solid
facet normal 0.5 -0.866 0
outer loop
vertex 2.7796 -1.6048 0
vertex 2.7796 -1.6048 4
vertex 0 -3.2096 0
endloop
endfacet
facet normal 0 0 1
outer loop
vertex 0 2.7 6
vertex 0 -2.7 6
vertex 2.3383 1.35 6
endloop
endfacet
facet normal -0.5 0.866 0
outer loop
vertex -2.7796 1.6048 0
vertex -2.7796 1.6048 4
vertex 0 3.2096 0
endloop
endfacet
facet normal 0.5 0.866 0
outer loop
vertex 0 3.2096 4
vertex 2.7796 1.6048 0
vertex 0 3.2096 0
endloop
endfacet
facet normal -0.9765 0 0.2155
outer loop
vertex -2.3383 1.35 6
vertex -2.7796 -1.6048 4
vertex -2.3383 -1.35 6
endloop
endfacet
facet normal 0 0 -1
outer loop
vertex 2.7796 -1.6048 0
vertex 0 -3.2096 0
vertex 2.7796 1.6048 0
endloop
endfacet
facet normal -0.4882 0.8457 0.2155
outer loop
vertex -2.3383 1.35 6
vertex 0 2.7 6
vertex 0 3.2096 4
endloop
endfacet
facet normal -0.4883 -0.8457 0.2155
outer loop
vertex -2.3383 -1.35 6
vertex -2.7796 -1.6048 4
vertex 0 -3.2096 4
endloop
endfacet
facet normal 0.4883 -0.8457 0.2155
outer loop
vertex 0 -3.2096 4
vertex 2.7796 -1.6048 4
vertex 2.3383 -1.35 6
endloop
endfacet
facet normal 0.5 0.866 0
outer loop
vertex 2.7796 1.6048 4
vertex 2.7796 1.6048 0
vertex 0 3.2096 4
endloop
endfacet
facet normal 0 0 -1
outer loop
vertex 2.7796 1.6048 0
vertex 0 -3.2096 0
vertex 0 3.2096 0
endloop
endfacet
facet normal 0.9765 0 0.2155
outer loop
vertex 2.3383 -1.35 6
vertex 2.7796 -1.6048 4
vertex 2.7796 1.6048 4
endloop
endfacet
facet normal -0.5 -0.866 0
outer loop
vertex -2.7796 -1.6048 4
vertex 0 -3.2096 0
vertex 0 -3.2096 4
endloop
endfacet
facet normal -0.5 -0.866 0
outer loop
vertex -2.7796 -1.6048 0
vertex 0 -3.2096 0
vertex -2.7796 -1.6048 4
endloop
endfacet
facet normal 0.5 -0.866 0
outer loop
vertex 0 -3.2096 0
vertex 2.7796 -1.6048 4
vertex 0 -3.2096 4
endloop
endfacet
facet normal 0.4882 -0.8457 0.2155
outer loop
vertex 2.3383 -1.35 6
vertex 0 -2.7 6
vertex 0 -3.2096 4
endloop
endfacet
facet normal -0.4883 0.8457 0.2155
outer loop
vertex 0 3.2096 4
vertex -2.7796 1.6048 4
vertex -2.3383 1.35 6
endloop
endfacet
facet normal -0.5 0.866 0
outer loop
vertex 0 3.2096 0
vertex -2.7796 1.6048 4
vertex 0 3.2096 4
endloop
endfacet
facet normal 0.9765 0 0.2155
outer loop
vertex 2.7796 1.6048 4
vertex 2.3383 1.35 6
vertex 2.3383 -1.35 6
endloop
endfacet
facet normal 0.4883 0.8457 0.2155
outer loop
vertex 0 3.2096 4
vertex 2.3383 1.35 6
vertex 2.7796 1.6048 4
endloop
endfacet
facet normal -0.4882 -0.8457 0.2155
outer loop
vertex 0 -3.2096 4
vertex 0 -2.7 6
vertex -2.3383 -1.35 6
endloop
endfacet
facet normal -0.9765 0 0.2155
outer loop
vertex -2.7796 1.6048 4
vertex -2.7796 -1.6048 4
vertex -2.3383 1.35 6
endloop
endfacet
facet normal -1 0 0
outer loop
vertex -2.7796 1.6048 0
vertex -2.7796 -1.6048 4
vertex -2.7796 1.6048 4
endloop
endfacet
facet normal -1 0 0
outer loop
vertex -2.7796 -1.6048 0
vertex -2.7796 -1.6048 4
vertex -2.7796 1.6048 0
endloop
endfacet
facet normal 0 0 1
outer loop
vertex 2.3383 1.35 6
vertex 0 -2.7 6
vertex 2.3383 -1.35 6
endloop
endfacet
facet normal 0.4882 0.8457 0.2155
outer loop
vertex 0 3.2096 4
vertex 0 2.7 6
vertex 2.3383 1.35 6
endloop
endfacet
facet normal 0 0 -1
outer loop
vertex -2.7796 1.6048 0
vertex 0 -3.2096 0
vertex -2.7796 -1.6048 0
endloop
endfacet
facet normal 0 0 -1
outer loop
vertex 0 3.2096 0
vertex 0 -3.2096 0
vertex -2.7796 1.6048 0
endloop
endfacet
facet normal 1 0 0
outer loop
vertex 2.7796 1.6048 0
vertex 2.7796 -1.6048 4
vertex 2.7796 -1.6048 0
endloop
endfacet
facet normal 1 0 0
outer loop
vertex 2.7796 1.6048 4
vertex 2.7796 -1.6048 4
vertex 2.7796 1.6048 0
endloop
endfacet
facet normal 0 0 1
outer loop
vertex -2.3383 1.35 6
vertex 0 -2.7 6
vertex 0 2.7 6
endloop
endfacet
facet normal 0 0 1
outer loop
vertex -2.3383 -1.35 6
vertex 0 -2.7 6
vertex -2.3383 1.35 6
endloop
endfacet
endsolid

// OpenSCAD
hull() {
								group() {
									multmatrix([[0.866025, -0.5, 0, 0], [0.5, 0.866025, 0, 0], [0, 0, 1, 0], [0, 0, 0, 1]]) {
										cylinder($fn = 6, $fa = 12, $fs = 2, h = 4, r1 = 3.20959, r2 = 3.20959, center = false);
									}
								}
								group() {
									multmatrix([[0.866025, -0.5, 0, 0], [0.5, 0.866025, 0, 0], [0, 0, 1, 0], [0, 0, 0, 1]]) {
										cylinder($fn = 6, $fa = 12, $fs = 2, h = 6, r1 = 2.7, r2 = 2.7, center = false);
									}
								}
							}
